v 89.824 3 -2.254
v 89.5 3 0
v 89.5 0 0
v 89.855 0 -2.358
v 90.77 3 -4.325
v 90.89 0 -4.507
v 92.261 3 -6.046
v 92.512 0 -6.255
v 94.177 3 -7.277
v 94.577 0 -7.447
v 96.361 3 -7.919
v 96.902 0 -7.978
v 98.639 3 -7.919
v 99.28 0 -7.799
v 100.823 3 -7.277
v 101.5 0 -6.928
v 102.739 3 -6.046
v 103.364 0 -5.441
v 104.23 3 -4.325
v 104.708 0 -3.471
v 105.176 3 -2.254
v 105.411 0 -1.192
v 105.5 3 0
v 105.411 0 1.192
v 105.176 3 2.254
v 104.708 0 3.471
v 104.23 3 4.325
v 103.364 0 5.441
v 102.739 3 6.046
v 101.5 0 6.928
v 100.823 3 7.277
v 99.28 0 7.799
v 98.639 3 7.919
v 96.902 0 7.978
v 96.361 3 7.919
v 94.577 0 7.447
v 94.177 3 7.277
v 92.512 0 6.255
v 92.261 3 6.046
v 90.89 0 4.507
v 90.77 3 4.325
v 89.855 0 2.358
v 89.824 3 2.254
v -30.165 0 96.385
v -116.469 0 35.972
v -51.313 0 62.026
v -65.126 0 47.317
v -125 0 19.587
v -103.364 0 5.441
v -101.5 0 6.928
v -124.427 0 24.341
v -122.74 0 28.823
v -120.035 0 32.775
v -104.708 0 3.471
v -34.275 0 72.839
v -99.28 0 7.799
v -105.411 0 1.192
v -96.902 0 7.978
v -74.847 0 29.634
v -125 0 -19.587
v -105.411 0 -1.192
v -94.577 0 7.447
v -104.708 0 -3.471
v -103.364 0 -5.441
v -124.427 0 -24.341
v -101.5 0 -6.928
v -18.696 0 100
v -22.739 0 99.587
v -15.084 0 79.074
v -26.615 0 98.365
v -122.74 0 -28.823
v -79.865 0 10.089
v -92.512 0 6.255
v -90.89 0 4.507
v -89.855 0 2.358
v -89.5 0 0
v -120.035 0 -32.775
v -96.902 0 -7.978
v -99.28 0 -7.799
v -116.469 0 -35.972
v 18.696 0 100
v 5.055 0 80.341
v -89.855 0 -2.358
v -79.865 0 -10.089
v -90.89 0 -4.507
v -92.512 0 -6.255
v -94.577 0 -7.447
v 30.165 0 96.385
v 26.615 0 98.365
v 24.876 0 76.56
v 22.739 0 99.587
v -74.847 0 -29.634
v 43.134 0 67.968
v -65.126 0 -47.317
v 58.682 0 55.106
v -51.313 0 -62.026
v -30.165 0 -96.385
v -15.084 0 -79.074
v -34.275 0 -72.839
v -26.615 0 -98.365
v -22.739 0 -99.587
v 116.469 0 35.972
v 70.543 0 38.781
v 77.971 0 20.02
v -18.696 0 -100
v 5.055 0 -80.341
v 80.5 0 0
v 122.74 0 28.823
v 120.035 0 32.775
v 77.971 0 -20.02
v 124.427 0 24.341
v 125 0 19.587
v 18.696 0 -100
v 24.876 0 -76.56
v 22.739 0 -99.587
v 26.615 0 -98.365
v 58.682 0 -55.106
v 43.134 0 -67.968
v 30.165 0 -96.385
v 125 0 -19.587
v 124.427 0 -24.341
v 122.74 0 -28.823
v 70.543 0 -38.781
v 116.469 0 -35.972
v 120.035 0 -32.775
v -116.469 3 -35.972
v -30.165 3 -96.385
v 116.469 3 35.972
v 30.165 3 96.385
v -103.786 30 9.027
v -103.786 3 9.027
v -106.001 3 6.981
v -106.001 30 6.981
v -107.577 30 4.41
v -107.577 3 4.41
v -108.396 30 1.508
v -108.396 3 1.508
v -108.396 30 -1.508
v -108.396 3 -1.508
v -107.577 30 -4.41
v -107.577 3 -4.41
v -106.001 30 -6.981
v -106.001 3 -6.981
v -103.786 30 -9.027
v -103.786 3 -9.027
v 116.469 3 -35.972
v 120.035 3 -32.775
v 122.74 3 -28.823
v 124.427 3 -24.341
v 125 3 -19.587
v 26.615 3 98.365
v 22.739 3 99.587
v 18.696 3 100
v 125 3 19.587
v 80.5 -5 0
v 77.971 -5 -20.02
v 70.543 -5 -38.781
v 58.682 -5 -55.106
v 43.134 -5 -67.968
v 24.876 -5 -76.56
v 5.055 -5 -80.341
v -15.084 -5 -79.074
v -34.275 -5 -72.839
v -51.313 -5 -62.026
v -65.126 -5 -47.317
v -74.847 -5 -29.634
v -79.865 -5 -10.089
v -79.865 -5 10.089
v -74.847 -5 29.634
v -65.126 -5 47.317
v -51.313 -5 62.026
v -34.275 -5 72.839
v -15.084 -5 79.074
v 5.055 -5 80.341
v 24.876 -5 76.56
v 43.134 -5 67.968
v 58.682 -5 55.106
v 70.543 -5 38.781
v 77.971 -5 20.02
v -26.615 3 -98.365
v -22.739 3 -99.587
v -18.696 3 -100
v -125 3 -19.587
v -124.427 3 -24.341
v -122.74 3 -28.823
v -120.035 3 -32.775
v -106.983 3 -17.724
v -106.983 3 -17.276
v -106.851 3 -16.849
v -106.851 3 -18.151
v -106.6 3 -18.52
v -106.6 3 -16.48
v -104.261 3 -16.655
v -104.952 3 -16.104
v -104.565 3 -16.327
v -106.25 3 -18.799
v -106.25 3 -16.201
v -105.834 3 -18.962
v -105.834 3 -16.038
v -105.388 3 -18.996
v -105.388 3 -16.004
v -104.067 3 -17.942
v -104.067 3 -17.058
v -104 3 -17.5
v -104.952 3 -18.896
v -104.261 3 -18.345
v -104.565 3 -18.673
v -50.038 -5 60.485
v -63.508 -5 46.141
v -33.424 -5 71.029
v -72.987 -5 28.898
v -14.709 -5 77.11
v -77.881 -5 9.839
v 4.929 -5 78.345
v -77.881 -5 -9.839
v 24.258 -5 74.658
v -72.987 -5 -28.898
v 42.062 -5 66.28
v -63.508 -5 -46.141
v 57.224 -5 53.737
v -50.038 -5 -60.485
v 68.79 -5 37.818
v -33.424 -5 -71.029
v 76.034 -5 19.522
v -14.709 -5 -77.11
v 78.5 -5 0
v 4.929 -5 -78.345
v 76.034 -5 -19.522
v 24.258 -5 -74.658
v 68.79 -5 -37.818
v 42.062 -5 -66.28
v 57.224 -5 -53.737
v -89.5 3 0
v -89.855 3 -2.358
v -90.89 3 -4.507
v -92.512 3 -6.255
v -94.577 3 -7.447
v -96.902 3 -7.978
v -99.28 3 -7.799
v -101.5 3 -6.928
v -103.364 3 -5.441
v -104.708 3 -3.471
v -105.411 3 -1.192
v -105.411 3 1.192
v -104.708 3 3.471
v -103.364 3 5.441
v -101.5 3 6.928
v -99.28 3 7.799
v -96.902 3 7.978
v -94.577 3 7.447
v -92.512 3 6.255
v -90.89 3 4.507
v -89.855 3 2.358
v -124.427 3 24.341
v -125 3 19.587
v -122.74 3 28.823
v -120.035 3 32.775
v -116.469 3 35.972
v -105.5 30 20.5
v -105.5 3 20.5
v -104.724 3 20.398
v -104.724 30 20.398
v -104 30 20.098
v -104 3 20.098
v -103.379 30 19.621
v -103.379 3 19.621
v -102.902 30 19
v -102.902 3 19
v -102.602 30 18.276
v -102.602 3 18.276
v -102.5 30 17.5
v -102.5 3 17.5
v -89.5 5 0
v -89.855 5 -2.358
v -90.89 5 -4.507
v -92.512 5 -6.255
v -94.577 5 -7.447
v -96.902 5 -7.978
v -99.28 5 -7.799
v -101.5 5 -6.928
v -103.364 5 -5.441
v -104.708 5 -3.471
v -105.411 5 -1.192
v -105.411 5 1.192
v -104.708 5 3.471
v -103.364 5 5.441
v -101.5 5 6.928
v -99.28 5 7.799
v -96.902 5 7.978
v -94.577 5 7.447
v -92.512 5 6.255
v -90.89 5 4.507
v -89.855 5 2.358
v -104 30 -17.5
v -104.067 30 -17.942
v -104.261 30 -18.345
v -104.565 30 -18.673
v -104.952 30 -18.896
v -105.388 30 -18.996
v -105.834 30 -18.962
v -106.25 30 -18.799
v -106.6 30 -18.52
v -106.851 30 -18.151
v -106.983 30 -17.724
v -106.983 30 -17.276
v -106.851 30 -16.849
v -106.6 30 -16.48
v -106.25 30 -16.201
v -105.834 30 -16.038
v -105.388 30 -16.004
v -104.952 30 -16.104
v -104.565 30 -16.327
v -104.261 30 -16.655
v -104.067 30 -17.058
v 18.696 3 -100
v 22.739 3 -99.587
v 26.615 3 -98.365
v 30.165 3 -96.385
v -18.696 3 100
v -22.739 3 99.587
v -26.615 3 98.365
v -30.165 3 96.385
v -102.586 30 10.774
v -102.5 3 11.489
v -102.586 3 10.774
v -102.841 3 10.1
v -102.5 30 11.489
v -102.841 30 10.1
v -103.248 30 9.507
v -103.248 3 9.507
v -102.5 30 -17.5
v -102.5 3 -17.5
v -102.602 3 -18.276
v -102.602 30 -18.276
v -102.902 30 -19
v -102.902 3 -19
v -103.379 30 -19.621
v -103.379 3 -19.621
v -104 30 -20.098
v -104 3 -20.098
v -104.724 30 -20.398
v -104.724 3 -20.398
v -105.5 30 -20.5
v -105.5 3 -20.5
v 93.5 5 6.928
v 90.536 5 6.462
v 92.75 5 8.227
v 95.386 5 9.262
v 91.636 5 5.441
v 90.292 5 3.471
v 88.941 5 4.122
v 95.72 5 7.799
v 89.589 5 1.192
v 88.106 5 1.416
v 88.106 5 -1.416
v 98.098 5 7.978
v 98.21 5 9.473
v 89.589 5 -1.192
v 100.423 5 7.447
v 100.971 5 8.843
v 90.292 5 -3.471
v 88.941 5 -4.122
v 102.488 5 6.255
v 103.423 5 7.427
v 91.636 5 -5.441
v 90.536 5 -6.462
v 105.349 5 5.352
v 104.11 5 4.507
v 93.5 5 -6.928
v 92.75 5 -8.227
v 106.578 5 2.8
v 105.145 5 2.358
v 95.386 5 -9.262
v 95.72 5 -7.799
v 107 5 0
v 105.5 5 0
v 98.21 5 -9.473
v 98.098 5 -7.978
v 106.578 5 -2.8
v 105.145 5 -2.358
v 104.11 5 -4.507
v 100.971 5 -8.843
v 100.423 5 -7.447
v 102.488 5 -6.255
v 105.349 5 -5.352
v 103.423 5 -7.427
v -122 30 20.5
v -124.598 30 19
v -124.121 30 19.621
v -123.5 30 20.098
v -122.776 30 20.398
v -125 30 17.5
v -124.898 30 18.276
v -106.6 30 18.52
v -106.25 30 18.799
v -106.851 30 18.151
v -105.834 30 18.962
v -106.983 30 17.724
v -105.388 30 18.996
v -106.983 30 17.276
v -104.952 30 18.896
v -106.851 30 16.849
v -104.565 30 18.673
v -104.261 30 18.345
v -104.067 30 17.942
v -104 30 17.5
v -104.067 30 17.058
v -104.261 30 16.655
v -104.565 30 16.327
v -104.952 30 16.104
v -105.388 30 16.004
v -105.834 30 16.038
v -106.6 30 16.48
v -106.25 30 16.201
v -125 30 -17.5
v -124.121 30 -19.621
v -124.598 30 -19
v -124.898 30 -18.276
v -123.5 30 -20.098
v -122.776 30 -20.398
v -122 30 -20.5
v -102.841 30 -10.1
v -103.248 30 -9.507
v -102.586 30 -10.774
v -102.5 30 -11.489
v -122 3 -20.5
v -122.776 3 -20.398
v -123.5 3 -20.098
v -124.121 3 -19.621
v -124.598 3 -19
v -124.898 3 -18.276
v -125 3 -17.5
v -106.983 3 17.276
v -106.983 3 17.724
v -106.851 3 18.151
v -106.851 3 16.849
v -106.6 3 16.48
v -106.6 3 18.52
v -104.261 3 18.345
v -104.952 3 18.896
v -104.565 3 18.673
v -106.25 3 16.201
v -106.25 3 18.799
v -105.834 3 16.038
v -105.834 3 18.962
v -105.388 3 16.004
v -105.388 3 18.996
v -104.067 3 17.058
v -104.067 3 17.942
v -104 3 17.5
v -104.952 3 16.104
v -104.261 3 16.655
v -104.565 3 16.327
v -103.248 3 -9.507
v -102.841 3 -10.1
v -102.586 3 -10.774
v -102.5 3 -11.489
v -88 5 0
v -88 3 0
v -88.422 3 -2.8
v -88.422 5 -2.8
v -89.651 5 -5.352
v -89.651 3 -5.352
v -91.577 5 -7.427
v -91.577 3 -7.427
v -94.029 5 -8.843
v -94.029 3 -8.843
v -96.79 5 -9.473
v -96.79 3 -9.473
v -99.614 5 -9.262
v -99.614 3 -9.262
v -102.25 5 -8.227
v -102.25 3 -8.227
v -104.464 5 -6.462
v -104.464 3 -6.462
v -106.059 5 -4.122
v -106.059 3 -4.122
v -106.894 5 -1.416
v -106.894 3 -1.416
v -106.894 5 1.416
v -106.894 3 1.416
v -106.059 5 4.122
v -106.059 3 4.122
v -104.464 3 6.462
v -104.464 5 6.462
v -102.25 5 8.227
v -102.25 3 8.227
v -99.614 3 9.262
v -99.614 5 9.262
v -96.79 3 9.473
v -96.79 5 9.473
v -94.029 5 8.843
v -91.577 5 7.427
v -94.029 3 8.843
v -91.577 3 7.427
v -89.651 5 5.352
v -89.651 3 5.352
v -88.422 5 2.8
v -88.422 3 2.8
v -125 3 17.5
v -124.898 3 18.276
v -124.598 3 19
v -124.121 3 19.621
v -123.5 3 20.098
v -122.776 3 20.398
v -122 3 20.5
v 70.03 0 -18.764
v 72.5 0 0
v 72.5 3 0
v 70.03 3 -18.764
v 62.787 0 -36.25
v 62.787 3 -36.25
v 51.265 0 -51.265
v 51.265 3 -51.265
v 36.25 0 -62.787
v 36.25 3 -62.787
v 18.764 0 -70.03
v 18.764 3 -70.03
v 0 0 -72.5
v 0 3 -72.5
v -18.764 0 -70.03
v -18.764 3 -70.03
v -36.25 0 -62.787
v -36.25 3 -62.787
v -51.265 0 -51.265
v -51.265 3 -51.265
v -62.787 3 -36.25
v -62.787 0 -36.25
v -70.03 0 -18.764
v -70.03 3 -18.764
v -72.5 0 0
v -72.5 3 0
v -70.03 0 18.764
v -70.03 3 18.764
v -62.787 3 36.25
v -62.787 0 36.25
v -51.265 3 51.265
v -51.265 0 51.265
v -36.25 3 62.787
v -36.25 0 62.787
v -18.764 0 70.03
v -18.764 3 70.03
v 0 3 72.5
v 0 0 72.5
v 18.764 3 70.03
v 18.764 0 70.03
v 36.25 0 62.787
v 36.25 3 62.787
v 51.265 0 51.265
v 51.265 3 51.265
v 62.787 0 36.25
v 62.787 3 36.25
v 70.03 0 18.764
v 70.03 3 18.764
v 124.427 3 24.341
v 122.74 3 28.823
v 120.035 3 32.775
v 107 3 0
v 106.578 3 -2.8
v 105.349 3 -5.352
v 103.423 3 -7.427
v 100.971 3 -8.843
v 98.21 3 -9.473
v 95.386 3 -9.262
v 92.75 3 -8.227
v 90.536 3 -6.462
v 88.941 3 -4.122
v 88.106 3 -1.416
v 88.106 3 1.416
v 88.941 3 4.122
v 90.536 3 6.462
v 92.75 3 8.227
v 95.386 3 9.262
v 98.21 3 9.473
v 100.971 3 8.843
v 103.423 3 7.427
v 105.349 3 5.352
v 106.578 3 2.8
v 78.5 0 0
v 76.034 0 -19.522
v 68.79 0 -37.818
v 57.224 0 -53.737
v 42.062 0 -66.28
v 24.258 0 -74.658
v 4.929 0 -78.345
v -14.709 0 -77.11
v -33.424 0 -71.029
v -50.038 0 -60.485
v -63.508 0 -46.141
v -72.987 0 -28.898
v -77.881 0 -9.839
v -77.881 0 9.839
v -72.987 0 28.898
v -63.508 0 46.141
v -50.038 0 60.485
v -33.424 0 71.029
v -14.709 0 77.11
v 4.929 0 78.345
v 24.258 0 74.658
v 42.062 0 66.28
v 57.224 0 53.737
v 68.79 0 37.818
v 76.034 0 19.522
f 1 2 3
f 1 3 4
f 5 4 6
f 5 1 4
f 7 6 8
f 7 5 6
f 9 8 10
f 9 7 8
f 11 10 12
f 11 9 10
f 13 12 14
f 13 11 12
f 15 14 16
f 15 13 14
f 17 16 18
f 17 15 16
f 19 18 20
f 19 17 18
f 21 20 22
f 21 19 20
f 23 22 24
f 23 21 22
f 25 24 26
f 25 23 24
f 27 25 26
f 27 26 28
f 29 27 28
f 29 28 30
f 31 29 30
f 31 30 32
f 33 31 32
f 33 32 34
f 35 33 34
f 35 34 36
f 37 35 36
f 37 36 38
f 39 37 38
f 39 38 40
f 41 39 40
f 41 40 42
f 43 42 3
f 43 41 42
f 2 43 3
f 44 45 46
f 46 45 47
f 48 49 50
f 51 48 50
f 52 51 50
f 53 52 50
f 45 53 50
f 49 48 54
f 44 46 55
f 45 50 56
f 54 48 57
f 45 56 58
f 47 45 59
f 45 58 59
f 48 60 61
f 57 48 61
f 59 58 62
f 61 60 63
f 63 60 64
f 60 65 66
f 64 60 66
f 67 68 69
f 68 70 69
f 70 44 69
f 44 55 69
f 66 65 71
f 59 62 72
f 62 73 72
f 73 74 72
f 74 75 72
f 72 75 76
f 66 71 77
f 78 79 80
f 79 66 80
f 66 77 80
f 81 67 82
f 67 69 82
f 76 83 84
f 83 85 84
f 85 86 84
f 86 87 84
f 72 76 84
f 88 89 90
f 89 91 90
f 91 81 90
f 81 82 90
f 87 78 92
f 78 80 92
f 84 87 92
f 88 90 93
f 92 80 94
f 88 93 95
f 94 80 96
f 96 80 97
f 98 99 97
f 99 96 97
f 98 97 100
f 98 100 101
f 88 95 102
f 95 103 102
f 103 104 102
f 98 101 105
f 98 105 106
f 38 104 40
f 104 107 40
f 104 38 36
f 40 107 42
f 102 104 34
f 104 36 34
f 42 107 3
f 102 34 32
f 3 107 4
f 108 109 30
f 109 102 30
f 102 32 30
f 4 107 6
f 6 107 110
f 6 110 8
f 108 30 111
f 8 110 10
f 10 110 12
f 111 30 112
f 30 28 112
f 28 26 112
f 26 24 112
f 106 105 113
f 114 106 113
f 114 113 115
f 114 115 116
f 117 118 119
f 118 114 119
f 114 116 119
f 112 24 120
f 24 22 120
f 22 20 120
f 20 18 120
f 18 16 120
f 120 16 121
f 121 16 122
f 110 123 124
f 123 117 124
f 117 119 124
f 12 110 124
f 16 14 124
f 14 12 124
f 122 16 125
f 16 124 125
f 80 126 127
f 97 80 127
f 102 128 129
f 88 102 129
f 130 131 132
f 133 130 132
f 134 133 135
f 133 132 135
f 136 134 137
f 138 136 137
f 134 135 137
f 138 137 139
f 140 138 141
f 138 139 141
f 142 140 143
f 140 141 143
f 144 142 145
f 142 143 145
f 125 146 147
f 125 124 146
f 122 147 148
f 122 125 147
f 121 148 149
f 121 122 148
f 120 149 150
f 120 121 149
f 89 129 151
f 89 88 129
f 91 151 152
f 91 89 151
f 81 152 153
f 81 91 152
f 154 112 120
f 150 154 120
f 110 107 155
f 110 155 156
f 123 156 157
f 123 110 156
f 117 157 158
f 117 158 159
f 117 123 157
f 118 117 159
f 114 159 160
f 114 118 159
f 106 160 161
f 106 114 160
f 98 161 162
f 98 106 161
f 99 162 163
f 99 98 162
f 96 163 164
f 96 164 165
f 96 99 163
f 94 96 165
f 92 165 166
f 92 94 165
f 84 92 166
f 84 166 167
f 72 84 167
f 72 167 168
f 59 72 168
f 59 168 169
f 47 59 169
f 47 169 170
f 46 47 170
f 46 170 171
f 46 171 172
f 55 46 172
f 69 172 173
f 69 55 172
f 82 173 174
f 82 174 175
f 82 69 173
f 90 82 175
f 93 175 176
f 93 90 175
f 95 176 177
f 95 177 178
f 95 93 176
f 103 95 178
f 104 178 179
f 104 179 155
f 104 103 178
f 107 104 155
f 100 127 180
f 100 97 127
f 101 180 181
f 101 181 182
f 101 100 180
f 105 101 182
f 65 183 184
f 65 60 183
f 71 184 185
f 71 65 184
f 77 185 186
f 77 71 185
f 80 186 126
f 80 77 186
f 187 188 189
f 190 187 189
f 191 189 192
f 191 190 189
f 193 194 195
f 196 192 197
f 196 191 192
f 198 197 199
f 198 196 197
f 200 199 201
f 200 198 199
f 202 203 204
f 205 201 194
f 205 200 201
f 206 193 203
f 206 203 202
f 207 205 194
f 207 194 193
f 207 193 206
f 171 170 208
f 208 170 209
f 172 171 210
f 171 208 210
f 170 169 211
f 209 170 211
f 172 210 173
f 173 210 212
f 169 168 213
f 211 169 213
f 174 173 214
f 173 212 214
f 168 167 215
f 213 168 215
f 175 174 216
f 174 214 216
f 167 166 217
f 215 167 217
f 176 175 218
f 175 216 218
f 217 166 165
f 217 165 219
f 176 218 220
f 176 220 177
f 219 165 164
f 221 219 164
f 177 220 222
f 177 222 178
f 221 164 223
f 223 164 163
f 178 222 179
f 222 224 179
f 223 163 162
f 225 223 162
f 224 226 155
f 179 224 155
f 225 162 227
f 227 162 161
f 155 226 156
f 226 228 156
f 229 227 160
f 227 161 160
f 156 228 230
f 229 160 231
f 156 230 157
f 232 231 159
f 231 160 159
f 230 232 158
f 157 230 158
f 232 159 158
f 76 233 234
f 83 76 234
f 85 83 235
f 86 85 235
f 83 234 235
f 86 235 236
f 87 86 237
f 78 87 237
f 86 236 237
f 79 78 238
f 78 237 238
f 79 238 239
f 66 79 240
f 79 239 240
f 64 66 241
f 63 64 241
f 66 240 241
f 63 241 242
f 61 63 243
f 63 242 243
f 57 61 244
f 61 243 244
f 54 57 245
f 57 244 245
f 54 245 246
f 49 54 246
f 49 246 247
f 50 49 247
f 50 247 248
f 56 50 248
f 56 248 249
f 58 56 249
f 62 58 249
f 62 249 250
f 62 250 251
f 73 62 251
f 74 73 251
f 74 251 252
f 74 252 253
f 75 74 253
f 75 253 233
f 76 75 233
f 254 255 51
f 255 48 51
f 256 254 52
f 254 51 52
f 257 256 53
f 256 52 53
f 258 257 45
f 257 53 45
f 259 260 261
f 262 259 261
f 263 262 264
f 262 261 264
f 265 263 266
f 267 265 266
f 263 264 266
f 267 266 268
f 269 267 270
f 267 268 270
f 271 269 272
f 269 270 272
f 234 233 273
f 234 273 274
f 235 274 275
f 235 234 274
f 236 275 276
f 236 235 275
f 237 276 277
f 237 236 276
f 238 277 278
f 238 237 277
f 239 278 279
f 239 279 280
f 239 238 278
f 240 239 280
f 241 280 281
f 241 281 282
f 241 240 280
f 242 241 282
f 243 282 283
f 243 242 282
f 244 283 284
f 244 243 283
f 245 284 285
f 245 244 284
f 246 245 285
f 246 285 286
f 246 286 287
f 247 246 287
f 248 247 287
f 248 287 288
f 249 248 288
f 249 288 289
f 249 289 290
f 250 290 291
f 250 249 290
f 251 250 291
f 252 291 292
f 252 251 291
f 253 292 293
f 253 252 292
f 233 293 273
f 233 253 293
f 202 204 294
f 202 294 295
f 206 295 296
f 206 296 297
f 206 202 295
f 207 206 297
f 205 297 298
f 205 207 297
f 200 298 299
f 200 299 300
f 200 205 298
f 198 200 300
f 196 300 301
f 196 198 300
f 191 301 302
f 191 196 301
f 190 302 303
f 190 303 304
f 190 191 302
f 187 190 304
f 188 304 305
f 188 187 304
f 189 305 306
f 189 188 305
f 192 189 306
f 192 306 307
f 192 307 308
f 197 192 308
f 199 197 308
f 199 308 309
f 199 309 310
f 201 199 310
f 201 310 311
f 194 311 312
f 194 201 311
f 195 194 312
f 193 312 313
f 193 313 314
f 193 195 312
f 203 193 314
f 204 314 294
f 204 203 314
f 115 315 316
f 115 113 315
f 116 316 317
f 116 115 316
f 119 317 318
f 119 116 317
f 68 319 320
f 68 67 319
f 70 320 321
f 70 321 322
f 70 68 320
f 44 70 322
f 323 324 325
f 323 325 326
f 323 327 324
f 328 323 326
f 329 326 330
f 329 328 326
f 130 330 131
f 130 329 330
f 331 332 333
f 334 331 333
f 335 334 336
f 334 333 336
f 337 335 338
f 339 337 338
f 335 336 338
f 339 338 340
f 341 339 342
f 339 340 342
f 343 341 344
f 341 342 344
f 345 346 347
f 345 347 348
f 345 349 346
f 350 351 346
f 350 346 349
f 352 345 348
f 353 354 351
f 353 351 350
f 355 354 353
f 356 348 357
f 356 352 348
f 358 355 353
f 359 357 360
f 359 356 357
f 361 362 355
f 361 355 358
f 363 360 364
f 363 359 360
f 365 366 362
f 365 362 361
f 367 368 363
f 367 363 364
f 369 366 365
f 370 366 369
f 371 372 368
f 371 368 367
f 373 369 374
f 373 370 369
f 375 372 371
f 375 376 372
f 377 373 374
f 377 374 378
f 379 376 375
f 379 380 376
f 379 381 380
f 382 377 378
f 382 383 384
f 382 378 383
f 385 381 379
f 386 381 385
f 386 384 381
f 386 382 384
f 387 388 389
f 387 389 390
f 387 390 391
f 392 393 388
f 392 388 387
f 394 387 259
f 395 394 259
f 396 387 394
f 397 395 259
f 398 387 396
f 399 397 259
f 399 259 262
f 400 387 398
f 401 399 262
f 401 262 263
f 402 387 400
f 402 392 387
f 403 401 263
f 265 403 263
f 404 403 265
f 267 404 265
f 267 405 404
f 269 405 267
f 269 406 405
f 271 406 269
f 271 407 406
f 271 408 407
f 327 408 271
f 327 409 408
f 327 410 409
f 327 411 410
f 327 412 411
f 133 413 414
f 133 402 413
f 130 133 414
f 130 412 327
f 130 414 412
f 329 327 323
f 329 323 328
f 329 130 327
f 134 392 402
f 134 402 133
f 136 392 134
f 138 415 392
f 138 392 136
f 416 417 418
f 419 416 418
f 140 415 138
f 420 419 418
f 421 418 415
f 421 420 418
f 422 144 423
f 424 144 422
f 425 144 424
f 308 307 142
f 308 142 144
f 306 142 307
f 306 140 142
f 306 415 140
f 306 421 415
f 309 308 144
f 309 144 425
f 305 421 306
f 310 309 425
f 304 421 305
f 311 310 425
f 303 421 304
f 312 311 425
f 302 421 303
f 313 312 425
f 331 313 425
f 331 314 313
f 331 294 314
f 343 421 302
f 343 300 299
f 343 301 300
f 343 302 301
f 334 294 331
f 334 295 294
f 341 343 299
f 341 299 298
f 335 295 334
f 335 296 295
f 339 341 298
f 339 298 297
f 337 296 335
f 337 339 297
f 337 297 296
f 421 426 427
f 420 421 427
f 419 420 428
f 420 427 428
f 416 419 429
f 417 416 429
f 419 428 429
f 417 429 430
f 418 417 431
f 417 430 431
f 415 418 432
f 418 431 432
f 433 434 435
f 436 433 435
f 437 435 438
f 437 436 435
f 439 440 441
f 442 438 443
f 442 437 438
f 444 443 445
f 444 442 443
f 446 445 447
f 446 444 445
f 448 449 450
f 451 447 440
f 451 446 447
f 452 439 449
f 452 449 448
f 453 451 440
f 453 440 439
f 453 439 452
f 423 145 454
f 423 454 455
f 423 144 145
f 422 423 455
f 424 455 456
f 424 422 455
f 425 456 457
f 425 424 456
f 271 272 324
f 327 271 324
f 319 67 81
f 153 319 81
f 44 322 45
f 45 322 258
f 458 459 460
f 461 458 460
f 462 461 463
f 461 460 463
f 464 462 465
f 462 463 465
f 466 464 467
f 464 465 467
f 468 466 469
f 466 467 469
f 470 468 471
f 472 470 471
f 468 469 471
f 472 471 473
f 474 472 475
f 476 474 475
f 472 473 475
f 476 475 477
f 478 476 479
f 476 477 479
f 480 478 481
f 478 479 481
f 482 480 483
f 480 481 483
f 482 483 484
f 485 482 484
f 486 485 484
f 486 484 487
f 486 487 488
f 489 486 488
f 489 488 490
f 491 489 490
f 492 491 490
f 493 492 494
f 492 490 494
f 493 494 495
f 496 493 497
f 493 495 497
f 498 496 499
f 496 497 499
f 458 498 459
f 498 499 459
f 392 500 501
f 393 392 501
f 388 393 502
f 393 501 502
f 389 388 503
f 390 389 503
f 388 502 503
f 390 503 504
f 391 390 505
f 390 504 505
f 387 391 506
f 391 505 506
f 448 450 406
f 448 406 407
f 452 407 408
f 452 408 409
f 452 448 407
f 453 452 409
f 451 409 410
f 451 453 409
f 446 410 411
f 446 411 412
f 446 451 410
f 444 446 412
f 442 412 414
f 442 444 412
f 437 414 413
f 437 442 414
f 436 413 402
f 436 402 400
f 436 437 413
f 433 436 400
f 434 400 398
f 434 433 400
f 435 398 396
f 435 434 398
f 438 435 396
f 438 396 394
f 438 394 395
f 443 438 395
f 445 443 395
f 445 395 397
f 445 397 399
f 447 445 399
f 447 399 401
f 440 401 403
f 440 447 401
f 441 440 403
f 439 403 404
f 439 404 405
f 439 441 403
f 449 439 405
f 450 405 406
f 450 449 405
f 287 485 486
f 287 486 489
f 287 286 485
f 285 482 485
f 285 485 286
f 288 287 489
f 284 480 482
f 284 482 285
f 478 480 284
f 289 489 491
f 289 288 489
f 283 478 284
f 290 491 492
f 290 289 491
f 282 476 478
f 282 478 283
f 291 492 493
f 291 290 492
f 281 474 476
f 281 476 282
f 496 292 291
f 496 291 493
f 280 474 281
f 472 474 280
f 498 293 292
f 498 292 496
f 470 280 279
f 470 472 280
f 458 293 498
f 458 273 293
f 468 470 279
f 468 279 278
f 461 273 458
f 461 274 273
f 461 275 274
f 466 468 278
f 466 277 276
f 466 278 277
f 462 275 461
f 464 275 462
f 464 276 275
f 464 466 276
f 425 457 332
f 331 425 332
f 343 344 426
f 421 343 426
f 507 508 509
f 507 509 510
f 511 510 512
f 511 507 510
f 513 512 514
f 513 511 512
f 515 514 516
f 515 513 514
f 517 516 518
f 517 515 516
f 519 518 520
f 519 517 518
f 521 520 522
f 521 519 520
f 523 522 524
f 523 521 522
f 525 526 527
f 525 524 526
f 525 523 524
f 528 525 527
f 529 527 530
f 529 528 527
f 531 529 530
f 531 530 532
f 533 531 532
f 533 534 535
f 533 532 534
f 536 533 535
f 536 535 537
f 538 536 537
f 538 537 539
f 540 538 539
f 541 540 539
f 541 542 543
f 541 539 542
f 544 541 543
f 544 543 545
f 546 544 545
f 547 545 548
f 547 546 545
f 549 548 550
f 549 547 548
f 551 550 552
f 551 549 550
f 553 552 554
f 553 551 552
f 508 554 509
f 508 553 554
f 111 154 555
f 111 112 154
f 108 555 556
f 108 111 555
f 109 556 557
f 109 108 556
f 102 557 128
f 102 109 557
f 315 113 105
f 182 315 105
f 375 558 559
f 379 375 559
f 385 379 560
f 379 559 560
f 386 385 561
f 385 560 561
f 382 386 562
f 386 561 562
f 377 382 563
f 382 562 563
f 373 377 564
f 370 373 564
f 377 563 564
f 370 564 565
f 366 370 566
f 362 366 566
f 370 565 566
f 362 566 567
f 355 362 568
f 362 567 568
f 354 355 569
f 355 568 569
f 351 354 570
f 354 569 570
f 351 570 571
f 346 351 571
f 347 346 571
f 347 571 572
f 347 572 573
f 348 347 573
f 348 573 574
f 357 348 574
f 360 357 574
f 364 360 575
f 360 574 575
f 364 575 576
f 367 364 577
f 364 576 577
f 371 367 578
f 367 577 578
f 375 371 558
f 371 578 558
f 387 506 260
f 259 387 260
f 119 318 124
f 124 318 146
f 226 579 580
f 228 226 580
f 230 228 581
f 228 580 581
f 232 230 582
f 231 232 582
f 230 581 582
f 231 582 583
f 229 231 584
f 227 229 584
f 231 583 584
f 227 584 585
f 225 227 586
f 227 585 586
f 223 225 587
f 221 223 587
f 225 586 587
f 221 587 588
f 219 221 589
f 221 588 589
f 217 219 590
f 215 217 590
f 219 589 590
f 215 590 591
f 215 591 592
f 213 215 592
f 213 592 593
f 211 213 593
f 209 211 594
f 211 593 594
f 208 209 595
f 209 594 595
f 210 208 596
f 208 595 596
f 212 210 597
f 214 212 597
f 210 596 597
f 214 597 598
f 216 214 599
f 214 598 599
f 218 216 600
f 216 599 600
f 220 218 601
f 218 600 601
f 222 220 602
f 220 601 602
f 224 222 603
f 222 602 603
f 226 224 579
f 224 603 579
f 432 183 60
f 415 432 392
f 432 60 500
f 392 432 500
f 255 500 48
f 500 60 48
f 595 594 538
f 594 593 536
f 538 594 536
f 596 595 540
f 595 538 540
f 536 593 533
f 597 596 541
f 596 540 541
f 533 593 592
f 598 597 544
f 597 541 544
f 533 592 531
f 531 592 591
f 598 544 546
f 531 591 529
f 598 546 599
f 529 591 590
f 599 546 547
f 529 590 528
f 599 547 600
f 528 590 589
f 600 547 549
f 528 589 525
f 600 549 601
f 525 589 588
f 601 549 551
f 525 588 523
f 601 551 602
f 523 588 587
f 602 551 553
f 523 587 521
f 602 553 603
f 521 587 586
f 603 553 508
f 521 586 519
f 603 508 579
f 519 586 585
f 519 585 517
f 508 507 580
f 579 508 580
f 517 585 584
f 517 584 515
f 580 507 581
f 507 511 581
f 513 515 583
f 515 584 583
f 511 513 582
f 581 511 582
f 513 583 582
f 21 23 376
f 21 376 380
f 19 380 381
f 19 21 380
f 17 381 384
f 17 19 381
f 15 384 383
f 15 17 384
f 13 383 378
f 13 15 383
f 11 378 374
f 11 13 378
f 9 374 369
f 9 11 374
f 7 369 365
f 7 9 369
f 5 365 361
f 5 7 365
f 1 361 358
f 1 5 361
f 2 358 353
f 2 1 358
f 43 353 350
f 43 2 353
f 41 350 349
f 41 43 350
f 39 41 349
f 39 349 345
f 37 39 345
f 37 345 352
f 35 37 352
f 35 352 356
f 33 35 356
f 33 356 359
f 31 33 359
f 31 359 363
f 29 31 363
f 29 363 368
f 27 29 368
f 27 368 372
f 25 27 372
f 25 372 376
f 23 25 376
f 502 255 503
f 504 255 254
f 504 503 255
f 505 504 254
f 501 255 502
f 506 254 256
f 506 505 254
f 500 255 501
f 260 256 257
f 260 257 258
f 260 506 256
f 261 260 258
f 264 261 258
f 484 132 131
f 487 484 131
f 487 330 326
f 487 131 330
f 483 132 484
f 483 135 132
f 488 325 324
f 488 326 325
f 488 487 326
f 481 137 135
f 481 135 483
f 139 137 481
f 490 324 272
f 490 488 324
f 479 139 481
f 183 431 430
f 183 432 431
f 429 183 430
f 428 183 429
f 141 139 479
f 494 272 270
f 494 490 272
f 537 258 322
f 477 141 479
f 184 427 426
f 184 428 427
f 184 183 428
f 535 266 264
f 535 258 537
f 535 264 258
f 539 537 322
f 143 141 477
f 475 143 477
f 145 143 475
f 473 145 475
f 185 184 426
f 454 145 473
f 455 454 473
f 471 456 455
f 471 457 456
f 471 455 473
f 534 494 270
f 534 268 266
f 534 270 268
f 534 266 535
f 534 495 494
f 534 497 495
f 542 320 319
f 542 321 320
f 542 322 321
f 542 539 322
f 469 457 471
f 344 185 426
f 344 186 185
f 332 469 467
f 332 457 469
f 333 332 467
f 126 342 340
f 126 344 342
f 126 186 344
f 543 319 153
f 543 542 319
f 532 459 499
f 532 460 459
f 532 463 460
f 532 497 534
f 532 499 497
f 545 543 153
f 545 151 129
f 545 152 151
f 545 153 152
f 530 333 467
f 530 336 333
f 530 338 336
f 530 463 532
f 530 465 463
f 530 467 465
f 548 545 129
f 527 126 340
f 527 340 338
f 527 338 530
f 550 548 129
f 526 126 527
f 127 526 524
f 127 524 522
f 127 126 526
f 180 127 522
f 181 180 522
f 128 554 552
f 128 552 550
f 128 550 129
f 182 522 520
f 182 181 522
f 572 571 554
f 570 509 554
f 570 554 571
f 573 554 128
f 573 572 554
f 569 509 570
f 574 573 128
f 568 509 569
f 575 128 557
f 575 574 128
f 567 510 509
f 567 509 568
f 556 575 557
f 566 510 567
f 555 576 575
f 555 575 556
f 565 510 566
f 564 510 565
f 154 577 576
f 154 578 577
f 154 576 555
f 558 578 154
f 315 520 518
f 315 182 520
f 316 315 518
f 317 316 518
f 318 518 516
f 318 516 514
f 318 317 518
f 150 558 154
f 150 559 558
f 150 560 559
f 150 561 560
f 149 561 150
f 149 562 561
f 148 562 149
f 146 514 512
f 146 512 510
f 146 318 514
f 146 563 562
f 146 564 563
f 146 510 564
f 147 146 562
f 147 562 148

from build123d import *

# Parameters (mm, degrees)
BOSS_EXTRUDE1_DEPTH = 3
SKETCH2_R           = 8
CUT_EXTRUDE1_DEPTH  = 4
SKETCH5_R           = 72.5
CUT_EXTRUDE4_DEPTH  = 4
SKETCH4_R           = 80.5
SKETCH4_R_2         = 78.5
EXTRUDE_THIN1_DEPTH = 5
SKETCH6_R           = 1.5
BOSS_EXTRUDE2_DEPTH = 27
FILLET1_R           = 3
CUT_EXTRUDE5_DEPTH  = 10
FILLET2_R           = 20
SKETCH8_R           = 9.5
SKETCH8_R_2         = 8
EXTRUDE_THIN2_DEPTH = 2


with BuildPart() as part:
    # Sketch1 → Boss-Extrude1 (new body)
    with BuildSketch(Plane(origin=(0, 0, 0), x_dir=(1, 0, 0), z_dir=(0, 1, 0))):
        with BuildLine():
            Line((-115, -100), (115, -100))
            ThreePointArc((115, -100), (122.071067812, -97.071067812), (125, -90))
            Line((125, -90), (125, 90))
            ThreePointArc((125, 90), (122.071067812, 97.071067812), (115, 100))
            Line((115, 100), (-115, 100))
            ThreePointArc((-115, 100), (-122.071067812, 97.071067812), (-125, 90))
            Line((-125, 90), (-125, -90))
            ThreePointArc((-125, -90), (-122.071067812, -97.071067812), (-115, -100))
        make_face()
    extrude(amount=BOSS_EXTRUDE1_DEPTH)

    # Sketch2 → Cut-Extrude1 (cut, through all)
    with BuildSketch(Plane(origin=(0, 3, 0), x_dir=(1, 0, 0), z_dir=(0, 1, 0))):
        with Locations((-97.5, 0)):
            Circle(SKETCH2_R)
    cut_extrude1 = extrude(amount=-CUT_EXTRUDE1_DEPTH, mode=Mode.SUBTRACT)

    # Mirror1: Cut-Extrude1 across plane
    add(cut_extrude1.mirror(Plane(origin=(0, 0, 0), x_dir=(0, 0, 1), z_dir=(1, 0, 0))), mode=Mode.SUBTRACT)

    # Sketch5 → Cut-Extrude4 (cut, through all)
    with BuildSketch(Plane(origin=(0, 0, 0), x_dir=(1, 0, 0), z_dir=(0, 1, 0))):
        Circle(SKETCH5_R)
    extrude(amount=CUT_EXTRUDE4_DEPTH, mode=Mode.SUBTRACT)

    # Sketch4 → Extrude-Thin1 (add)
    with BuildSketch(Plane(origin=(0, 0, 0), x_dir=(1, 0, 0), z_dir=(0, 1, 0))):
        Circle(SKETCH4_R)
        Circle(SKETCH4_R_2, mode=Mode.SUBTRACT)
    extrude(amount=-EXTRUDE_THIN1_DEPTH)

    # Sketch6 → Boss-Extrude2 (add)
    with BuildSketch(Plane(origin=(0, 3, 0), x_dir=(1, 0, 0), z_dir=(0, 1, 0))):
        with BuildLine():
            ThreePointArc((-125, -17.5), (-124.121320344, -19.621320344), (-122, -20.5))
            Line((-122, -20.5), (-105.5, -20.5))
            ThreePointArc((-105.5, -20.5), (-103.378679656, -19.621320344), (-102.5, -17.5))
            Line((-102.5, -17.5), (-102.5, -9.797958971))
            ThreePointArc((-102.5, -9.797958971), (-108.5, 0), (-102.5, 9.797958971))
            Line((-102.5, 9.797958971), (-102.5, 17.5))
            ThreePointArc((-102.5, 17.5), (-103.378679656, 19.621320344), (-105.5, 20.5))
            Line((-105.5, 20.5), (-122, 20.5))
            ThreePointArc((-122, 20.5), (-124.121320344, 19.621320344), (-125, 17.5))
            Line((-125, 17.5), (-125, -17.5))
        make_face()
        with Locations((-105.5, -17.5)):
            Circle(SKETCH6_R, mode=Mode.SUBTRACT)
        with Locations((-105.5, 17.5)):
            Circle(SKETCH6_R, mode=Mode.SUBTRACT)
    extrude(amount=BOSS_EXTRUDE2_DEPTH)

    # Fillet1
    fillet1_edges = [part.edges().sort_by_distance(p)[0] for p in [
        (-102.5, 16.5, 9.797958971),
        (-102.5, 16.5, -9.797958971),
    ]]
    fillet(fillet1_edges, radius=FILLET1_R)

    # Sketch7 → Cut-Extrude5 (cut)
    with BuildSketch(Plane(origin=(0, 3, 0), x_dir=(1, 0, 0), z_dir=(0, 1, 0))):
        with BuildLine():
            Line((-125, 90), (-125, 30))
            Line((-125, 30), (-25, 100))
            Line((-25, 100), (-115, 100))
            ThreePointArc((-115, 100), (-122.071067812, 97.071067812), (-125, 90))
        make_face()
        with BuildLine():
            Line((25, 100), (125, 30))
            Line((125, 30), (125, 90))
            ThreePointArc((125, 90), (122.071067812, 97.071067812), (115, 100))
            Line((115, 100), (25, 100))
        make_face()
        with BuildLine():
            Line((125, -30), (25, -100))
            Line((25, -100), (115, -100))
            ThreePointArc((115, -100), (122.071067812, -97.071067812), (125, -90))
            Line((125, -90), (125, -30))
        make_face()
        with BuildLine():
            ThreePointArc((-125, -90), (-122.071067812, -97.071067812), (-115, -100))
            Line((-115, -100), (-25, -100))
            Line((-25, -100), (-125, -30))
            Line((-125, -30), (-125, -90))
        make_face()
    extrude(amount=-CUT_EXTRUDE5_DEPTH, mode=Mode.SUBTRACT)

    # Fillet2
    fillet2_edges = [part.edges().sort_by_distance(p)[0] for p in [
        (-125, 1.5, 30),
        (-25, 1.5, 100),
        (125, 1.5, 30),
        (25, 1.5, 100),
        (25, 1.5, -100),
        (125, 1.5, -30),
        (-125, 1.5, -30),
        (-25, 1.5, -100),
    ]]
    fillet(fillet2_edges, radius=FILLET2_R)

    # Sketch8 → Extrude-Thin2 (add)
    with BuildSketch(Plane(origin=(0, 3, 0), x_dir=(1, 0, 0), z_dir=(0, 1, 0))):
        with Locations((-97.5, 0)):
            Circle(SKETCH8_R)
        with Locations((-97.5, 0)):
            Circle(SKETCH8_R_2, mode=Mode.SUBTRACT)
        with Locations((97.5, 0)):
            Circle(SKETCH8_R)
        with Locations((97.5, 0)):
            Circle(SKETCH8_R_2, mode=Mode.SUBTRACT)
    extrude(amount=EXTRUDE_THIN2_DEPTH)


solid = part.part
